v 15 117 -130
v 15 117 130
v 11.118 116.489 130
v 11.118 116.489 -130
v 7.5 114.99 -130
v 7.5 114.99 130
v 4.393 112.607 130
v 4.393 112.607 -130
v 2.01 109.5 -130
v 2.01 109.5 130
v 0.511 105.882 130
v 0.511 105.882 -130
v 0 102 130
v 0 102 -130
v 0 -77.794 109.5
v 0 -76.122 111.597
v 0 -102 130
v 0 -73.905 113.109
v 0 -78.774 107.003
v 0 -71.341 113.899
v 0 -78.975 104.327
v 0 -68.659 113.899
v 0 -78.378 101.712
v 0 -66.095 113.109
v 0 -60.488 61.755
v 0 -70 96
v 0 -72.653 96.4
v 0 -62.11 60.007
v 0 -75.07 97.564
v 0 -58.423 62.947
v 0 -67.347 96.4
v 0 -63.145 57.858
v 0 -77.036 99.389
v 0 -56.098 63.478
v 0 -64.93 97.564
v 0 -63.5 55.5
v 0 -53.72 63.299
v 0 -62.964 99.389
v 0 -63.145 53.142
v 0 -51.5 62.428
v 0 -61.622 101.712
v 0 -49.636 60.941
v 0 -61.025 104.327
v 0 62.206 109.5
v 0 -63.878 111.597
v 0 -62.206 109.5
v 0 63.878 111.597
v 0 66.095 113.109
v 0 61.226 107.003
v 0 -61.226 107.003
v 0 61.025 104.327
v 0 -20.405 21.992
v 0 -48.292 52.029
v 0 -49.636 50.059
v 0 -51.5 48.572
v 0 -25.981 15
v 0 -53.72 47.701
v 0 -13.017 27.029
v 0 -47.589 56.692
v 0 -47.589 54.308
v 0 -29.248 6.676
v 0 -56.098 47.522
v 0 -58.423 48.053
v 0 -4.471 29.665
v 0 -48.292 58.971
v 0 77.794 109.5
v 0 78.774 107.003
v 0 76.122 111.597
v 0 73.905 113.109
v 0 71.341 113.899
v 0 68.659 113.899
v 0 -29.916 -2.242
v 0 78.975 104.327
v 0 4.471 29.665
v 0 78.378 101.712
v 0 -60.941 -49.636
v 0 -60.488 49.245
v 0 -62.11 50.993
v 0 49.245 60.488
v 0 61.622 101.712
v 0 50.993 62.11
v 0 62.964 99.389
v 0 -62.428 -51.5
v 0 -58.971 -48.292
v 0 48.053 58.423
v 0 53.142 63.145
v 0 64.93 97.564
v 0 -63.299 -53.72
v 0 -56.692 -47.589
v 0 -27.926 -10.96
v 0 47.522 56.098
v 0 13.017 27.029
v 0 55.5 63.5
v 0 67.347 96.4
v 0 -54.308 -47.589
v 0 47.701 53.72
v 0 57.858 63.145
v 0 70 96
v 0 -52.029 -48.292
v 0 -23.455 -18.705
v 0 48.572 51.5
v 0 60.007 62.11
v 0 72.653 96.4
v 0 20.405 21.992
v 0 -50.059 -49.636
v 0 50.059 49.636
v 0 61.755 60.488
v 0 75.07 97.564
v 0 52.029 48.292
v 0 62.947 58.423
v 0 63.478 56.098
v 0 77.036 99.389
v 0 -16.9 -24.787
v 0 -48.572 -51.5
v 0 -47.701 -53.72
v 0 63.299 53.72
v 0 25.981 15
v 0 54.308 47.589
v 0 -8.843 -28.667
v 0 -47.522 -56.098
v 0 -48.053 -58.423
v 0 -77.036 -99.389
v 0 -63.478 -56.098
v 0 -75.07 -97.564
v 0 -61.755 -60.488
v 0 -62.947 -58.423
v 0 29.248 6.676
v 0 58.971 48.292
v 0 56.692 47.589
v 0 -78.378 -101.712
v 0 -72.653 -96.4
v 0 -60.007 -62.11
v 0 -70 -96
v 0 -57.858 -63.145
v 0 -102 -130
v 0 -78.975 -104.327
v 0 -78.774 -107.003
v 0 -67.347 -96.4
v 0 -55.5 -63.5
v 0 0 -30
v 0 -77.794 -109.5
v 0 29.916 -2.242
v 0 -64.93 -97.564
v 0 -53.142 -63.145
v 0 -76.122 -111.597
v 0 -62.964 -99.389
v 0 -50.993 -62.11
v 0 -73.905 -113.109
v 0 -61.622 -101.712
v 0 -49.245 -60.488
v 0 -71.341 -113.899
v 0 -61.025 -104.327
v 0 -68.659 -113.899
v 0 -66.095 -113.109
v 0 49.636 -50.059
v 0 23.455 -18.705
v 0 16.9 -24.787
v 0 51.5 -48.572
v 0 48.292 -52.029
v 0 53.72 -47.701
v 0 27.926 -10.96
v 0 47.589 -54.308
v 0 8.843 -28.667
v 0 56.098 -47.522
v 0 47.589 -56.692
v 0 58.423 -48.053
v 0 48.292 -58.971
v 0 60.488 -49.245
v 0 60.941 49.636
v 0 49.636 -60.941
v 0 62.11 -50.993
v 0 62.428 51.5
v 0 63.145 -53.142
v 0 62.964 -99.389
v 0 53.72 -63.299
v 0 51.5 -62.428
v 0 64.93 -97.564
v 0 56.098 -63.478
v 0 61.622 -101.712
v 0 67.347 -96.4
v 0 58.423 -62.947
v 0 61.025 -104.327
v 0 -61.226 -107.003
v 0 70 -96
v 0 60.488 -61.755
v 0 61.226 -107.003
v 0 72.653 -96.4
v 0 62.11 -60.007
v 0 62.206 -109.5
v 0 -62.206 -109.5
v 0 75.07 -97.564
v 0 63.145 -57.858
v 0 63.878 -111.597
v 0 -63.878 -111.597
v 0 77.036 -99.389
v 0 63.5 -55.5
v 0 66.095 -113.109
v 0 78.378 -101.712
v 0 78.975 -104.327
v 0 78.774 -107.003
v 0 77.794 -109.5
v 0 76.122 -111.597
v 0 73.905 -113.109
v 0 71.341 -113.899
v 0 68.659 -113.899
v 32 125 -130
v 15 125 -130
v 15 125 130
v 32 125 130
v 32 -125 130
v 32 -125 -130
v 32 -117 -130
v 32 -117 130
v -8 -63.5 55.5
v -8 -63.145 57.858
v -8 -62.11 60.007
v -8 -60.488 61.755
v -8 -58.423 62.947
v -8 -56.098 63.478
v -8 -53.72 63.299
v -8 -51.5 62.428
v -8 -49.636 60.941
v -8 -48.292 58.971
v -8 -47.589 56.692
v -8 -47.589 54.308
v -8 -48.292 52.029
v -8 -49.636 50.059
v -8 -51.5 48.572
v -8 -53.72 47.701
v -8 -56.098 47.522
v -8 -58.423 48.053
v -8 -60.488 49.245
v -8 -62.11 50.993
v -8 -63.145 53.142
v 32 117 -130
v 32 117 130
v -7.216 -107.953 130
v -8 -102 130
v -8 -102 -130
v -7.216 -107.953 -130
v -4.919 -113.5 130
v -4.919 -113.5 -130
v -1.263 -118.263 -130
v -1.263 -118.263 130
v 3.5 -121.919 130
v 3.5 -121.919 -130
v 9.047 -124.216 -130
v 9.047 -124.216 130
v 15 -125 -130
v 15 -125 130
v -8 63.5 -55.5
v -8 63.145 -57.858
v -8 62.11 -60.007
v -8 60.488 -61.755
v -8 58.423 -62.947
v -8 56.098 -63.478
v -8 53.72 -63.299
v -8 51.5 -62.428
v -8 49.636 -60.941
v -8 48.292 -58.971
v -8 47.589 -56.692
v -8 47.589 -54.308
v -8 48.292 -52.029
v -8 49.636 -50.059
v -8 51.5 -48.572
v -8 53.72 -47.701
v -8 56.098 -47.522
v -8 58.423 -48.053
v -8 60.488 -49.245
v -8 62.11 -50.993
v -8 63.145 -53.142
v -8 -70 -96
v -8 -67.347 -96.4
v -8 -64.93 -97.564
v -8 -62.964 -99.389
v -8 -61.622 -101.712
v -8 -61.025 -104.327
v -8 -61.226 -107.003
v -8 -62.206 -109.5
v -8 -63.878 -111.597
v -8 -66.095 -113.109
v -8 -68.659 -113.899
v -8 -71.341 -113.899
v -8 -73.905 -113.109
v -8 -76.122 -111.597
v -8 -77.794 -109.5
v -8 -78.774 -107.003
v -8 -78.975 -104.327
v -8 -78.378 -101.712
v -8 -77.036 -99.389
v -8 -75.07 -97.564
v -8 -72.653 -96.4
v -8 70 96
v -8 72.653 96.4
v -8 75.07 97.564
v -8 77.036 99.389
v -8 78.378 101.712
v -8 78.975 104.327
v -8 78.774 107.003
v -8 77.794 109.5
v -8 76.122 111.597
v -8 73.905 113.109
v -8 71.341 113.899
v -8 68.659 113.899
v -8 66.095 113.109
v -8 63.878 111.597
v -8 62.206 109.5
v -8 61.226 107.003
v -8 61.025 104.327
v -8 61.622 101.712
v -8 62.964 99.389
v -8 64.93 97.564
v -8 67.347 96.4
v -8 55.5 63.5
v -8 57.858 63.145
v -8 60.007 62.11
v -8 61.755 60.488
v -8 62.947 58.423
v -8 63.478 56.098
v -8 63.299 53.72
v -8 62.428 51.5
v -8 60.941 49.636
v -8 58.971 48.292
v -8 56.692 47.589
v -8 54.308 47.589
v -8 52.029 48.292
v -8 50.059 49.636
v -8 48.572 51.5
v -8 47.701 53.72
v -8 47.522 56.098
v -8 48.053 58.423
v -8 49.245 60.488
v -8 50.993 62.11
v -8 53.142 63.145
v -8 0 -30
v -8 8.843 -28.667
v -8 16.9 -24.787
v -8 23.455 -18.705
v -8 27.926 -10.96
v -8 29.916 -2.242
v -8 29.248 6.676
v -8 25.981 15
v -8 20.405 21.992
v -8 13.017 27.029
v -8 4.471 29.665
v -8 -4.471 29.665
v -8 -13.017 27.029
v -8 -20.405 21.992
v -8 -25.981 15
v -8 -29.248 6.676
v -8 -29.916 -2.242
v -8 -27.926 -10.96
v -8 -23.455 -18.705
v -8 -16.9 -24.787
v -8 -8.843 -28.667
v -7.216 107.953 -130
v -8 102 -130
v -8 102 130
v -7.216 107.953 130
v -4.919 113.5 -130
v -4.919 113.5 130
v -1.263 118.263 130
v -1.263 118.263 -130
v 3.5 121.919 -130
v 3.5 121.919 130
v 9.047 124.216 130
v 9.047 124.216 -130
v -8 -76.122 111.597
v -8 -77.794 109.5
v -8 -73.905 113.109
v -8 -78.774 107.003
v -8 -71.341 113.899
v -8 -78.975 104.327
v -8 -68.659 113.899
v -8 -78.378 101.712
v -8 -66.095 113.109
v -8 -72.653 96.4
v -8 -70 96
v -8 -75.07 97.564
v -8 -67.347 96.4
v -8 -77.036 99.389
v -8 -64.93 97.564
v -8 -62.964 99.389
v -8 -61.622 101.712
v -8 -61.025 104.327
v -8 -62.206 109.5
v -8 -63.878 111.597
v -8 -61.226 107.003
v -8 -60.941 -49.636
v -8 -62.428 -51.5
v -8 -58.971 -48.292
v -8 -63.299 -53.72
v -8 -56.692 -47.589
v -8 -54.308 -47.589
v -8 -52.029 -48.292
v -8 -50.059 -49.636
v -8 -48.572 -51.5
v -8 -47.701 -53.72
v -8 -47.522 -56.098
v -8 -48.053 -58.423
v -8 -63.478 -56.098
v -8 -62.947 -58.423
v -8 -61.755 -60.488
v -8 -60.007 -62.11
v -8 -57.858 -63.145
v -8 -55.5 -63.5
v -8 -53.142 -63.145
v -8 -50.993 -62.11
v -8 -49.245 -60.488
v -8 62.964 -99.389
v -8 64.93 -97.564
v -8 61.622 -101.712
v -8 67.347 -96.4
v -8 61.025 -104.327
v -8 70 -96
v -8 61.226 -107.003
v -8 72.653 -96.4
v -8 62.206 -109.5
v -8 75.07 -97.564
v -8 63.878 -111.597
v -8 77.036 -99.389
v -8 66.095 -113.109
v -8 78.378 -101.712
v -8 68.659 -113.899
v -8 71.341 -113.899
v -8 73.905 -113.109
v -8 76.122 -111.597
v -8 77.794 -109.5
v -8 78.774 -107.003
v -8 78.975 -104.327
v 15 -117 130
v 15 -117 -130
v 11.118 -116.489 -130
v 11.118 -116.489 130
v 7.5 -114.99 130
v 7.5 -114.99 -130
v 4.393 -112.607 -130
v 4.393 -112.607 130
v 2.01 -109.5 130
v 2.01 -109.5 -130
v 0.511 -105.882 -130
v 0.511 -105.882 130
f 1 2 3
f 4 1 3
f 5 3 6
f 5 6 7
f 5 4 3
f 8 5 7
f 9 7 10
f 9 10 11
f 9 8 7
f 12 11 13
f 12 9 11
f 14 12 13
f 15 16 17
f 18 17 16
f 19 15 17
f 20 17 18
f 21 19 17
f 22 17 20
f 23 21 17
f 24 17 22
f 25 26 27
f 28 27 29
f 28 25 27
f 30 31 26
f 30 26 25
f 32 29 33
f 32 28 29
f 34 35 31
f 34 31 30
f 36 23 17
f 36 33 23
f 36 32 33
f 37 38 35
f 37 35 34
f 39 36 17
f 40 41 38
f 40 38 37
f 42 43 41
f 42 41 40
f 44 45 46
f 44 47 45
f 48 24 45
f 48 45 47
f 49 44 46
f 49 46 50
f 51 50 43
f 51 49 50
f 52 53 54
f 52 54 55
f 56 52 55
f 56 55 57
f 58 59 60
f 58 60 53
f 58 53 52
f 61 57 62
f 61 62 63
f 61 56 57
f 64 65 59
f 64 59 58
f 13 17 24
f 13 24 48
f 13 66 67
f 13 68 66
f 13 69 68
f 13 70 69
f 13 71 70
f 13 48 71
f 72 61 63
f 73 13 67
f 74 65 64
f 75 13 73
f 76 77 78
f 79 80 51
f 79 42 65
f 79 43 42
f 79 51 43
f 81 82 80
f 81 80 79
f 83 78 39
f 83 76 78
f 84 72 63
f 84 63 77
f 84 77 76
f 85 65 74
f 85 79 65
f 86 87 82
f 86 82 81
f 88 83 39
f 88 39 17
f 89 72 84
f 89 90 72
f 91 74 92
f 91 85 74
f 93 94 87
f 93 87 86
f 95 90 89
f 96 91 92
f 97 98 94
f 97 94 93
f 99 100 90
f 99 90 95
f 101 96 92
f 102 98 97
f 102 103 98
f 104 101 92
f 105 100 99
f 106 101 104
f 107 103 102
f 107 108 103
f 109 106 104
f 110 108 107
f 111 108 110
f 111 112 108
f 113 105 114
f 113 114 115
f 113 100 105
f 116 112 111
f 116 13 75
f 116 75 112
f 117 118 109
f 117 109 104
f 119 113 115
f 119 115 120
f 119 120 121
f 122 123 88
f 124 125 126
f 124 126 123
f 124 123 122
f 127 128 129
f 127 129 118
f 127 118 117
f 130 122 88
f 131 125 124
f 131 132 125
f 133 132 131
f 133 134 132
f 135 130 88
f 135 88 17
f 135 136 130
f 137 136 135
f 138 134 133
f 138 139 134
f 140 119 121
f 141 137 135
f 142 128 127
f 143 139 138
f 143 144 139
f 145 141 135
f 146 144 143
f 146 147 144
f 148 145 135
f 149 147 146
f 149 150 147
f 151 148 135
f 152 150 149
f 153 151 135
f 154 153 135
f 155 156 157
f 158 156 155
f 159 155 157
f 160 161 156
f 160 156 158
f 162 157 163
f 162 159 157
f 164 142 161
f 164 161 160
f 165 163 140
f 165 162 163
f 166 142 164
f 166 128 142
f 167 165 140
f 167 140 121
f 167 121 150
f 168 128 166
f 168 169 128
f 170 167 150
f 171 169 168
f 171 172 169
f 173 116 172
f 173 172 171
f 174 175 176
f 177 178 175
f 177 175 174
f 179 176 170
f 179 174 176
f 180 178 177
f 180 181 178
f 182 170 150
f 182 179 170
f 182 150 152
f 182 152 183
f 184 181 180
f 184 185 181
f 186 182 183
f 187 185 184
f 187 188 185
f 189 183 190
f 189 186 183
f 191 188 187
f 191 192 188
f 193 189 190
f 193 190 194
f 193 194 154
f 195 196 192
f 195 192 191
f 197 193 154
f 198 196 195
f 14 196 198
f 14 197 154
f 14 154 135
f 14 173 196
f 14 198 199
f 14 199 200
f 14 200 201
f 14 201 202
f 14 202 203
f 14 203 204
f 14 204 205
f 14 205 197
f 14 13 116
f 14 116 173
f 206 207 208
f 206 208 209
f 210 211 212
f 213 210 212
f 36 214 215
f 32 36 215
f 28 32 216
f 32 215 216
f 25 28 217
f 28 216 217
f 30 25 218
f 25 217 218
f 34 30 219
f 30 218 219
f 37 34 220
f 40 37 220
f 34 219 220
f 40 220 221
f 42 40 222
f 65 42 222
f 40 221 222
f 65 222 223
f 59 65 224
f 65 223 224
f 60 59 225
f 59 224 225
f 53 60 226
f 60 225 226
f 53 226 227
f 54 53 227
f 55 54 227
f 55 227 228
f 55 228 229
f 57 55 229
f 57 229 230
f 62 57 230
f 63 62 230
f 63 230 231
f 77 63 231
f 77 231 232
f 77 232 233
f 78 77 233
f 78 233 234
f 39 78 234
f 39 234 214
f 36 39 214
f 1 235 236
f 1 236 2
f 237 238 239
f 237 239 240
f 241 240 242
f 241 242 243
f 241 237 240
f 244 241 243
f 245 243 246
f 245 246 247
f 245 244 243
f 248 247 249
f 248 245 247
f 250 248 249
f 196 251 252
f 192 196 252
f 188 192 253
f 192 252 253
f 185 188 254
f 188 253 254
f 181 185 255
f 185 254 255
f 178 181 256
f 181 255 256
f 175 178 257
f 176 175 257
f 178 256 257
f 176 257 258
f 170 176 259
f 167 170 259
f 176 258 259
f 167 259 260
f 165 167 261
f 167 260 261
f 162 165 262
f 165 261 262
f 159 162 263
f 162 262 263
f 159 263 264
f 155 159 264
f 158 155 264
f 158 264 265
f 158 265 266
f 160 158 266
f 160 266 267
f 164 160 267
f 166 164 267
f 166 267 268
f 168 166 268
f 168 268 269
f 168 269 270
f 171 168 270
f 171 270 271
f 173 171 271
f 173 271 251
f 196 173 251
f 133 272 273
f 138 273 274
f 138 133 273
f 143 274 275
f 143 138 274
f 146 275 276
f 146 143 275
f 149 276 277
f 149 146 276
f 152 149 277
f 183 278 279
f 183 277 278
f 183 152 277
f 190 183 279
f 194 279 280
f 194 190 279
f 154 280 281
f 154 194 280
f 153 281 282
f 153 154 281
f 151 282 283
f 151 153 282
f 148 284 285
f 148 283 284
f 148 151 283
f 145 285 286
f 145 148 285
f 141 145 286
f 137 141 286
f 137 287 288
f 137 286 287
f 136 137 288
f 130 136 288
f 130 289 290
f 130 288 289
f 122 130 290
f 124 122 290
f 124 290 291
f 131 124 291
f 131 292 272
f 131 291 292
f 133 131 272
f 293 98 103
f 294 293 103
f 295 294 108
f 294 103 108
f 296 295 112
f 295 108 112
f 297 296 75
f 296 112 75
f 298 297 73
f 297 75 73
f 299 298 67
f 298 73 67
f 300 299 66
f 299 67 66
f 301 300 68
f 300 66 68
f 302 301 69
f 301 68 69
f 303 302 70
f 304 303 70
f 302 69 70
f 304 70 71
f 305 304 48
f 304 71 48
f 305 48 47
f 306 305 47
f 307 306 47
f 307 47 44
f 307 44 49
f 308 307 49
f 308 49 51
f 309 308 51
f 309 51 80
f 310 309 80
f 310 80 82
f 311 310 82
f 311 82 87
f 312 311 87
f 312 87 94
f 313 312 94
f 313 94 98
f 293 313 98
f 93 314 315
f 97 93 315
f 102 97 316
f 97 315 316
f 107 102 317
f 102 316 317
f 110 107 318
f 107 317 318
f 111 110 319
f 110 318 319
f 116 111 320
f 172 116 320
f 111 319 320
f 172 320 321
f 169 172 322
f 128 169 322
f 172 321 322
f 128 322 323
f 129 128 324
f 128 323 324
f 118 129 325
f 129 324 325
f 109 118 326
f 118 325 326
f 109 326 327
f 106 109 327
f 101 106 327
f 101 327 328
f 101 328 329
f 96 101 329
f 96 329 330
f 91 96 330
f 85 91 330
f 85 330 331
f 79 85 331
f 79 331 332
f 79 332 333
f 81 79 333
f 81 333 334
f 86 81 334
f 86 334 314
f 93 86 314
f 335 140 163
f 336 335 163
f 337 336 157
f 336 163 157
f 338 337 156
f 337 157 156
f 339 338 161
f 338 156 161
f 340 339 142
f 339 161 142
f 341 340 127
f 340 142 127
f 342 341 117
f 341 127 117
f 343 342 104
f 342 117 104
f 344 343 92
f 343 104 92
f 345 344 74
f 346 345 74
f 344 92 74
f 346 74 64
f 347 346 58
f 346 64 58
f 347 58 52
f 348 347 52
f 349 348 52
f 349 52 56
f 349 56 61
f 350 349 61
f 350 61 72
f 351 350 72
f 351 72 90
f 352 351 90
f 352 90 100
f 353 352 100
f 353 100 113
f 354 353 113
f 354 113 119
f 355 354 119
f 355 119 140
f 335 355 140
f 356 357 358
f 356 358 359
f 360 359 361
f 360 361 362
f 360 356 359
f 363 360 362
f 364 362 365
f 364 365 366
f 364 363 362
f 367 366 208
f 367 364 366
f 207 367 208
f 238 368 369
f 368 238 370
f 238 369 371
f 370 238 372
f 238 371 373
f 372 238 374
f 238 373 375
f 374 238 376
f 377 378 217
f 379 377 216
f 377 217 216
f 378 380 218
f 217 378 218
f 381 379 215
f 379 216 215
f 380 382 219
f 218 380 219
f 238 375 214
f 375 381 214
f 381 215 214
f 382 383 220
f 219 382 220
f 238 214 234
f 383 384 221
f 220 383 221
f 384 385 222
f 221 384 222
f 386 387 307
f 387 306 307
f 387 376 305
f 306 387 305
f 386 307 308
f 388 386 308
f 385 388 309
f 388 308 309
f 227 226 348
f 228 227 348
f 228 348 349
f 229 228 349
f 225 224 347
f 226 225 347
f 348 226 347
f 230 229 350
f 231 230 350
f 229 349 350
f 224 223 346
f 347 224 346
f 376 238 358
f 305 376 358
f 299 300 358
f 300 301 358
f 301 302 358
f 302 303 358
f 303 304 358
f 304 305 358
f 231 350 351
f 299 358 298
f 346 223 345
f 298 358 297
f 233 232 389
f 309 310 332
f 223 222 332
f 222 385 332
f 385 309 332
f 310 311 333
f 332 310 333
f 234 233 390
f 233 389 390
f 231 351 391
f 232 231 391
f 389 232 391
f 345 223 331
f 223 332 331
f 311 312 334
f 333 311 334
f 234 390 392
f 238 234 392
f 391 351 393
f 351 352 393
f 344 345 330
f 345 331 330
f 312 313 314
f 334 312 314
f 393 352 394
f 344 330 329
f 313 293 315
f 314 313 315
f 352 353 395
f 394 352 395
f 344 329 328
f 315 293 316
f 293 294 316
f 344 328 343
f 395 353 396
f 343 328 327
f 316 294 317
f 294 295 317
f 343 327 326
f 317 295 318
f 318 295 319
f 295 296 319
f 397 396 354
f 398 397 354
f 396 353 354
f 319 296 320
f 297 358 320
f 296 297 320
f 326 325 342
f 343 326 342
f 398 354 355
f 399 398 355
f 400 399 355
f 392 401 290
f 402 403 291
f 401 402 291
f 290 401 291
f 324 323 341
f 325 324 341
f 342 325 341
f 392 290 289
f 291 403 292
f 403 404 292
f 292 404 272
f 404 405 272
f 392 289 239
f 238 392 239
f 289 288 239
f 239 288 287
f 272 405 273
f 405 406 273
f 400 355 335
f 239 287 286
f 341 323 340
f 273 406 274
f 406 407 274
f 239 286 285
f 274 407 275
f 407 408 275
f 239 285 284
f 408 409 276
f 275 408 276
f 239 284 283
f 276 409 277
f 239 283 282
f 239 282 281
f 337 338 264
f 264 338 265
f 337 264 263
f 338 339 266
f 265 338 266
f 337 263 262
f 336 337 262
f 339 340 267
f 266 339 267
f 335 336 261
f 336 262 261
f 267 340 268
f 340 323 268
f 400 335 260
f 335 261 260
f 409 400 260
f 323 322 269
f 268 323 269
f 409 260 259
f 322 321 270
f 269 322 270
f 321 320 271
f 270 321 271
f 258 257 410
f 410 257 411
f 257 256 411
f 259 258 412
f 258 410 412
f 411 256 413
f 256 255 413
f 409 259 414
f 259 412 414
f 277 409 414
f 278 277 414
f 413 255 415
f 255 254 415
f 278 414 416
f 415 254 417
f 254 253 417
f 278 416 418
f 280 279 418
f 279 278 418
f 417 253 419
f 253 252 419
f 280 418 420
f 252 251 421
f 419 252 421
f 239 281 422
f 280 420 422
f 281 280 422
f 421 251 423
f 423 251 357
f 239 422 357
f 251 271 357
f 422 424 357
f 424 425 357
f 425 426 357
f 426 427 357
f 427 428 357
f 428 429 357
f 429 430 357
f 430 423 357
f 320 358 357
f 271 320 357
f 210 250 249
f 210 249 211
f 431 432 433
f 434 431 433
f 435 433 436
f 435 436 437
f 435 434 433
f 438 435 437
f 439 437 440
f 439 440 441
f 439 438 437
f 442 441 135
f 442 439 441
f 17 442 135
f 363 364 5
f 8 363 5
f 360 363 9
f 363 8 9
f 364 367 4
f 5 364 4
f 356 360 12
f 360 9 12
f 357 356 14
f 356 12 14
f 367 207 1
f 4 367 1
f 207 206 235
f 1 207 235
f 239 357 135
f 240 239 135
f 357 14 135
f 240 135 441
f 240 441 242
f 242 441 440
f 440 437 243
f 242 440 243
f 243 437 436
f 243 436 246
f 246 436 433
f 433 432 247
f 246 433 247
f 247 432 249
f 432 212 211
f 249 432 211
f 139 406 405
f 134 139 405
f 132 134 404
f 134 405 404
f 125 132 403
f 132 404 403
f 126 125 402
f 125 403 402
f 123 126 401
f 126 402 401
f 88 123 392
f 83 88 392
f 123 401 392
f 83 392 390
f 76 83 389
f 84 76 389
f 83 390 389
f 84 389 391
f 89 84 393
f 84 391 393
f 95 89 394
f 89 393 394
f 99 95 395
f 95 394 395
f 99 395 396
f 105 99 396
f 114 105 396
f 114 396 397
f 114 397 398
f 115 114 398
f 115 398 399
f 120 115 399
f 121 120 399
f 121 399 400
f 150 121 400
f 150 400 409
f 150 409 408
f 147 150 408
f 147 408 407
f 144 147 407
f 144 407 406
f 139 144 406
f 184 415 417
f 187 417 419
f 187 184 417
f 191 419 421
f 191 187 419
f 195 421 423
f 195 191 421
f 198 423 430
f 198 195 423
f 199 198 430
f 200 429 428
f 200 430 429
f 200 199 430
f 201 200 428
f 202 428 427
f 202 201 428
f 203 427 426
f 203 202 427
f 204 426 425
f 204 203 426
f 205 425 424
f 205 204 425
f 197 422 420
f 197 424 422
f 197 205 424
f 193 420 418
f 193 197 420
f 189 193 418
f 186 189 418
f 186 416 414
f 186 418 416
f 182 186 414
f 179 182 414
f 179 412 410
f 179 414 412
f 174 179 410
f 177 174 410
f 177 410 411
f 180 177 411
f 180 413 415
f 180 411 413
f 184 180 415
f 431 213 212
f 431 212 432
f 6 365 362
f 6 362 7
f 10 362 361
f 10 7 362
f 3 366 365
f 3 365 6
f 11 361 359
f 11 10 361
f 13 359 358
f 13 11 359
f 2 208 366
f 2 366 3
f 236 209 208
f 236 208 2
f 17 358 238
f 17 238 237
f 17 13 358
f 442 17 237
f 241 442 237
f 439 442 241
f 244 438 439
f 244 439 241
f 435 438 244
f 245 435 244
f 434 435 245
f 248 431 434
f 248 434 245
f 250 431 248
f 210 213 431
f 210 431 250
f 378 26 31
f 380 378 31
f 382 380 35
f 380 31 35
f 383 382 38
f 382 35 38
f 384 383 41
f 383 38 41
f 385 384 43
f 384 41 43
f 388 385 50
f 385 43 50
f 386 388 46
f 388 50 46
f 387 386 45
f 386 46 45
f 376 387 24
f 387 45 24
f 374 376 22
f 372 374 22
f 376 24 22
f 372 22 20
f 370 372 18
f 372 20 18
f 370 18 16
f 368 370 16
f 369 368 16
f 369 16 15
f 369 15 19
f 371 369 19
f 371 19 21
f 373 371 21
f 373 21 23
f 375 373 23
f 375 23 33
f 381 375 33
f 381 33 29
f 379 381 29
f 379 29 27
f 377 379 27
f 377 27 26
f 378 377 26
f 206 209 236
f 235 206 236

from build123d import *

# Parameters (mm, degrees)
SKETCH1_W                      = 260
SKETCH1_H                      = 250
BASE_FLANGE1_DEPTH             = 8
SKETCH2_R                      = 30
CUT_EXTRUDE1_DEPTH             = 10
EDGE_FLANGE1_STRIP_W           = 62
EDGE_FLANGE1_STRIP_H           = 8
EDGE_FLANGE1_STRIP_CUT_DEPTH   = 260
EDGE_FLANGE1_STRIP_2_W         = 62
EDGE_FLANGE1_STRIP_2_H         = 8
EDGE_FLANGE1_STRIP_CUT_2_DEPTH = 260
EDGE_FLANGE1_DEPTH             = 260
EDGE_FLANGE1_BEND_DEPTH        = 260
SKETCH9_R                      = 9
CUT_EXTRUDE2_DEPTH             = 10
SKETCH10_R                     = 8
CUT_EXTRUDE3_DEPTH             = 10
CIRPATTERN1_COUNT              = 4


# Sheet-metal steps are written as plain solids
with BuildPart() as part:
    # Sketch1 → Base-Flange1 (new body)
    with BuildSketch(Plane(origin=(0, 0, 0), x_dir=(0, 0, -1), z_dir=(1, 0, 0))):
        Rectangle(SKETCH1_W, SKETCH1_H)
    extrude(amount=-BASE_FLANGE1_DEPTH)

    # Sketch2 → Cut-Extrude1 (cut)
    with BuildSketch(Plane(origin=(0, 0, 0), x_dir=(0, 0, -1), z_dir=(1, 0, 0))):
        Circle(SKETCH2_R)
    extrude(amount=-CUT_EXTRUDE1_DEPTH, mode=Mode.SUBTRACT)

    # Edge-Flange1 strip (across the edge) → Edge-Flange1 strip cut (cut)
    with BuildSketch(Plane(origin=(0, 125, -130), x_dir=(0, -1, 0), z_dir=(0, 0, 1))):
        with Locations((-8, -4)):
            Rectangle(EDGE_FLANGE1_STRIP_W, EDGE_FLANGE1_STRIP_H)
    extrude(amount=EDGE_FLANGE1_STRIP_CUT_DEPTH, mode=Mode.SUBTRACT)

    # Edge-Flange1 strip 2 (across the edge) → Edge-Flange1 strip cut 2 (cut)
    with BuildSketch(Plane(origin=(0, -125, 130), x_dir=(0, 1, 0), z_dir=(0, 0, -1))):
        with Locations((-8, -4)):
            Rectangle(EDGE_FLANGE1_STRIP_2_W, EDGE_FLANGE1_STRIP_2_H)
    extrude(amount=EDGE_FLANGE1_STRIP_CUT_2_DEPTH, mode=Mode.SUBTRACT)

    # Edge-Flange1 section (across the edge) → Edge-Flange1 (add)
    with BuildSketch(Plane(origin=(0, 125, -130), x_dir=(0, -1, 0), z_dir=(0, 0, 1))):
        with BuildLine():
            Line((0, 15), (0, 32))
            Line((0, 32), (8, 32))
            Line((8, 32), (8, 15))
            ThreePointArc((8, 15), (12.393398282, 4.393398282), (23, 0))
            Line((23, 0), (23, -8))
            ThreePointArc((23, -8), (6.736544033, -1.263455967), (0, 15))
        make_face()
    extrude(amount=EDGE_FLANGE1_DEPTH)

    # Edge-Flange1 section 2 (across the edge) → Edge-Flange1 bend (add)
    with BuildSketch(Plane(origin=(0, -125, 130), x_dir=(0, 1, 0), z_dir=(0, 0, -1))):
        with BuildLine():
            Line((0, 15), (0, 32))
            Line((0, 32), (8, 32))
            Line((8, 32), (8, 15))
            ThreePointArc((8, 15), (12.393398282, 4.393398282), (23, 0))
            Line((23, 0), (23, -8))
            ThreePointArc((23, -8), (6.736544033, -1.263455967), (0, 15))
        make_face()
    extrude(amount=EDGE_FLANGE1_BEND_DEPTH)

    # Sketch9 → Cut-Extrude2 (cut)
    with BuildSketch(Plane(origin=(0, 0, 0), x_dir=(0, 0, -1), z_dir=(1, 0, 0))):
        with Locations((-105, -70)):
            Circle(SKETCH9_R)
        with Locations((-105, 70)):
            Circle(SKETCH9_R)
    cut_extrude2 = extrude(amount=-CUT_EXTRUDE2_DEPTH, mode=Mode.SUBTRACT)

    # Mirror1: Cut-Extrude2 across plane
    add(cut_extrude2.mirror(Plane.XY), mode=Mode.SUBTRACT)

    # Sketch10 → Cut-Extrude3 (cut)
    with BuildSketch(Plane.ZY.offset(8)):
        with Locations((55.5, 55.5)):
            Circle(SKETCH10_R)
    cut_extrude3 = extrude(amount=-CUT_EXTRUDE3_DEPTH, mode=Mode.SUBTRACT)

    # CirPattern1: Cut-Extrude3 ×4 about axis
    cirpattern1_axis = Axis((0, 0, 0), (1, 0, 0))
    for i in range(1, CIRPATTERN1_COUNT):
        add(cut_extrude3.rotate(cirpattern1_axis, i * 360 / CIRPATTERN1_COUNT), mode=Mode.SUBTRACT)


solid = part.part
